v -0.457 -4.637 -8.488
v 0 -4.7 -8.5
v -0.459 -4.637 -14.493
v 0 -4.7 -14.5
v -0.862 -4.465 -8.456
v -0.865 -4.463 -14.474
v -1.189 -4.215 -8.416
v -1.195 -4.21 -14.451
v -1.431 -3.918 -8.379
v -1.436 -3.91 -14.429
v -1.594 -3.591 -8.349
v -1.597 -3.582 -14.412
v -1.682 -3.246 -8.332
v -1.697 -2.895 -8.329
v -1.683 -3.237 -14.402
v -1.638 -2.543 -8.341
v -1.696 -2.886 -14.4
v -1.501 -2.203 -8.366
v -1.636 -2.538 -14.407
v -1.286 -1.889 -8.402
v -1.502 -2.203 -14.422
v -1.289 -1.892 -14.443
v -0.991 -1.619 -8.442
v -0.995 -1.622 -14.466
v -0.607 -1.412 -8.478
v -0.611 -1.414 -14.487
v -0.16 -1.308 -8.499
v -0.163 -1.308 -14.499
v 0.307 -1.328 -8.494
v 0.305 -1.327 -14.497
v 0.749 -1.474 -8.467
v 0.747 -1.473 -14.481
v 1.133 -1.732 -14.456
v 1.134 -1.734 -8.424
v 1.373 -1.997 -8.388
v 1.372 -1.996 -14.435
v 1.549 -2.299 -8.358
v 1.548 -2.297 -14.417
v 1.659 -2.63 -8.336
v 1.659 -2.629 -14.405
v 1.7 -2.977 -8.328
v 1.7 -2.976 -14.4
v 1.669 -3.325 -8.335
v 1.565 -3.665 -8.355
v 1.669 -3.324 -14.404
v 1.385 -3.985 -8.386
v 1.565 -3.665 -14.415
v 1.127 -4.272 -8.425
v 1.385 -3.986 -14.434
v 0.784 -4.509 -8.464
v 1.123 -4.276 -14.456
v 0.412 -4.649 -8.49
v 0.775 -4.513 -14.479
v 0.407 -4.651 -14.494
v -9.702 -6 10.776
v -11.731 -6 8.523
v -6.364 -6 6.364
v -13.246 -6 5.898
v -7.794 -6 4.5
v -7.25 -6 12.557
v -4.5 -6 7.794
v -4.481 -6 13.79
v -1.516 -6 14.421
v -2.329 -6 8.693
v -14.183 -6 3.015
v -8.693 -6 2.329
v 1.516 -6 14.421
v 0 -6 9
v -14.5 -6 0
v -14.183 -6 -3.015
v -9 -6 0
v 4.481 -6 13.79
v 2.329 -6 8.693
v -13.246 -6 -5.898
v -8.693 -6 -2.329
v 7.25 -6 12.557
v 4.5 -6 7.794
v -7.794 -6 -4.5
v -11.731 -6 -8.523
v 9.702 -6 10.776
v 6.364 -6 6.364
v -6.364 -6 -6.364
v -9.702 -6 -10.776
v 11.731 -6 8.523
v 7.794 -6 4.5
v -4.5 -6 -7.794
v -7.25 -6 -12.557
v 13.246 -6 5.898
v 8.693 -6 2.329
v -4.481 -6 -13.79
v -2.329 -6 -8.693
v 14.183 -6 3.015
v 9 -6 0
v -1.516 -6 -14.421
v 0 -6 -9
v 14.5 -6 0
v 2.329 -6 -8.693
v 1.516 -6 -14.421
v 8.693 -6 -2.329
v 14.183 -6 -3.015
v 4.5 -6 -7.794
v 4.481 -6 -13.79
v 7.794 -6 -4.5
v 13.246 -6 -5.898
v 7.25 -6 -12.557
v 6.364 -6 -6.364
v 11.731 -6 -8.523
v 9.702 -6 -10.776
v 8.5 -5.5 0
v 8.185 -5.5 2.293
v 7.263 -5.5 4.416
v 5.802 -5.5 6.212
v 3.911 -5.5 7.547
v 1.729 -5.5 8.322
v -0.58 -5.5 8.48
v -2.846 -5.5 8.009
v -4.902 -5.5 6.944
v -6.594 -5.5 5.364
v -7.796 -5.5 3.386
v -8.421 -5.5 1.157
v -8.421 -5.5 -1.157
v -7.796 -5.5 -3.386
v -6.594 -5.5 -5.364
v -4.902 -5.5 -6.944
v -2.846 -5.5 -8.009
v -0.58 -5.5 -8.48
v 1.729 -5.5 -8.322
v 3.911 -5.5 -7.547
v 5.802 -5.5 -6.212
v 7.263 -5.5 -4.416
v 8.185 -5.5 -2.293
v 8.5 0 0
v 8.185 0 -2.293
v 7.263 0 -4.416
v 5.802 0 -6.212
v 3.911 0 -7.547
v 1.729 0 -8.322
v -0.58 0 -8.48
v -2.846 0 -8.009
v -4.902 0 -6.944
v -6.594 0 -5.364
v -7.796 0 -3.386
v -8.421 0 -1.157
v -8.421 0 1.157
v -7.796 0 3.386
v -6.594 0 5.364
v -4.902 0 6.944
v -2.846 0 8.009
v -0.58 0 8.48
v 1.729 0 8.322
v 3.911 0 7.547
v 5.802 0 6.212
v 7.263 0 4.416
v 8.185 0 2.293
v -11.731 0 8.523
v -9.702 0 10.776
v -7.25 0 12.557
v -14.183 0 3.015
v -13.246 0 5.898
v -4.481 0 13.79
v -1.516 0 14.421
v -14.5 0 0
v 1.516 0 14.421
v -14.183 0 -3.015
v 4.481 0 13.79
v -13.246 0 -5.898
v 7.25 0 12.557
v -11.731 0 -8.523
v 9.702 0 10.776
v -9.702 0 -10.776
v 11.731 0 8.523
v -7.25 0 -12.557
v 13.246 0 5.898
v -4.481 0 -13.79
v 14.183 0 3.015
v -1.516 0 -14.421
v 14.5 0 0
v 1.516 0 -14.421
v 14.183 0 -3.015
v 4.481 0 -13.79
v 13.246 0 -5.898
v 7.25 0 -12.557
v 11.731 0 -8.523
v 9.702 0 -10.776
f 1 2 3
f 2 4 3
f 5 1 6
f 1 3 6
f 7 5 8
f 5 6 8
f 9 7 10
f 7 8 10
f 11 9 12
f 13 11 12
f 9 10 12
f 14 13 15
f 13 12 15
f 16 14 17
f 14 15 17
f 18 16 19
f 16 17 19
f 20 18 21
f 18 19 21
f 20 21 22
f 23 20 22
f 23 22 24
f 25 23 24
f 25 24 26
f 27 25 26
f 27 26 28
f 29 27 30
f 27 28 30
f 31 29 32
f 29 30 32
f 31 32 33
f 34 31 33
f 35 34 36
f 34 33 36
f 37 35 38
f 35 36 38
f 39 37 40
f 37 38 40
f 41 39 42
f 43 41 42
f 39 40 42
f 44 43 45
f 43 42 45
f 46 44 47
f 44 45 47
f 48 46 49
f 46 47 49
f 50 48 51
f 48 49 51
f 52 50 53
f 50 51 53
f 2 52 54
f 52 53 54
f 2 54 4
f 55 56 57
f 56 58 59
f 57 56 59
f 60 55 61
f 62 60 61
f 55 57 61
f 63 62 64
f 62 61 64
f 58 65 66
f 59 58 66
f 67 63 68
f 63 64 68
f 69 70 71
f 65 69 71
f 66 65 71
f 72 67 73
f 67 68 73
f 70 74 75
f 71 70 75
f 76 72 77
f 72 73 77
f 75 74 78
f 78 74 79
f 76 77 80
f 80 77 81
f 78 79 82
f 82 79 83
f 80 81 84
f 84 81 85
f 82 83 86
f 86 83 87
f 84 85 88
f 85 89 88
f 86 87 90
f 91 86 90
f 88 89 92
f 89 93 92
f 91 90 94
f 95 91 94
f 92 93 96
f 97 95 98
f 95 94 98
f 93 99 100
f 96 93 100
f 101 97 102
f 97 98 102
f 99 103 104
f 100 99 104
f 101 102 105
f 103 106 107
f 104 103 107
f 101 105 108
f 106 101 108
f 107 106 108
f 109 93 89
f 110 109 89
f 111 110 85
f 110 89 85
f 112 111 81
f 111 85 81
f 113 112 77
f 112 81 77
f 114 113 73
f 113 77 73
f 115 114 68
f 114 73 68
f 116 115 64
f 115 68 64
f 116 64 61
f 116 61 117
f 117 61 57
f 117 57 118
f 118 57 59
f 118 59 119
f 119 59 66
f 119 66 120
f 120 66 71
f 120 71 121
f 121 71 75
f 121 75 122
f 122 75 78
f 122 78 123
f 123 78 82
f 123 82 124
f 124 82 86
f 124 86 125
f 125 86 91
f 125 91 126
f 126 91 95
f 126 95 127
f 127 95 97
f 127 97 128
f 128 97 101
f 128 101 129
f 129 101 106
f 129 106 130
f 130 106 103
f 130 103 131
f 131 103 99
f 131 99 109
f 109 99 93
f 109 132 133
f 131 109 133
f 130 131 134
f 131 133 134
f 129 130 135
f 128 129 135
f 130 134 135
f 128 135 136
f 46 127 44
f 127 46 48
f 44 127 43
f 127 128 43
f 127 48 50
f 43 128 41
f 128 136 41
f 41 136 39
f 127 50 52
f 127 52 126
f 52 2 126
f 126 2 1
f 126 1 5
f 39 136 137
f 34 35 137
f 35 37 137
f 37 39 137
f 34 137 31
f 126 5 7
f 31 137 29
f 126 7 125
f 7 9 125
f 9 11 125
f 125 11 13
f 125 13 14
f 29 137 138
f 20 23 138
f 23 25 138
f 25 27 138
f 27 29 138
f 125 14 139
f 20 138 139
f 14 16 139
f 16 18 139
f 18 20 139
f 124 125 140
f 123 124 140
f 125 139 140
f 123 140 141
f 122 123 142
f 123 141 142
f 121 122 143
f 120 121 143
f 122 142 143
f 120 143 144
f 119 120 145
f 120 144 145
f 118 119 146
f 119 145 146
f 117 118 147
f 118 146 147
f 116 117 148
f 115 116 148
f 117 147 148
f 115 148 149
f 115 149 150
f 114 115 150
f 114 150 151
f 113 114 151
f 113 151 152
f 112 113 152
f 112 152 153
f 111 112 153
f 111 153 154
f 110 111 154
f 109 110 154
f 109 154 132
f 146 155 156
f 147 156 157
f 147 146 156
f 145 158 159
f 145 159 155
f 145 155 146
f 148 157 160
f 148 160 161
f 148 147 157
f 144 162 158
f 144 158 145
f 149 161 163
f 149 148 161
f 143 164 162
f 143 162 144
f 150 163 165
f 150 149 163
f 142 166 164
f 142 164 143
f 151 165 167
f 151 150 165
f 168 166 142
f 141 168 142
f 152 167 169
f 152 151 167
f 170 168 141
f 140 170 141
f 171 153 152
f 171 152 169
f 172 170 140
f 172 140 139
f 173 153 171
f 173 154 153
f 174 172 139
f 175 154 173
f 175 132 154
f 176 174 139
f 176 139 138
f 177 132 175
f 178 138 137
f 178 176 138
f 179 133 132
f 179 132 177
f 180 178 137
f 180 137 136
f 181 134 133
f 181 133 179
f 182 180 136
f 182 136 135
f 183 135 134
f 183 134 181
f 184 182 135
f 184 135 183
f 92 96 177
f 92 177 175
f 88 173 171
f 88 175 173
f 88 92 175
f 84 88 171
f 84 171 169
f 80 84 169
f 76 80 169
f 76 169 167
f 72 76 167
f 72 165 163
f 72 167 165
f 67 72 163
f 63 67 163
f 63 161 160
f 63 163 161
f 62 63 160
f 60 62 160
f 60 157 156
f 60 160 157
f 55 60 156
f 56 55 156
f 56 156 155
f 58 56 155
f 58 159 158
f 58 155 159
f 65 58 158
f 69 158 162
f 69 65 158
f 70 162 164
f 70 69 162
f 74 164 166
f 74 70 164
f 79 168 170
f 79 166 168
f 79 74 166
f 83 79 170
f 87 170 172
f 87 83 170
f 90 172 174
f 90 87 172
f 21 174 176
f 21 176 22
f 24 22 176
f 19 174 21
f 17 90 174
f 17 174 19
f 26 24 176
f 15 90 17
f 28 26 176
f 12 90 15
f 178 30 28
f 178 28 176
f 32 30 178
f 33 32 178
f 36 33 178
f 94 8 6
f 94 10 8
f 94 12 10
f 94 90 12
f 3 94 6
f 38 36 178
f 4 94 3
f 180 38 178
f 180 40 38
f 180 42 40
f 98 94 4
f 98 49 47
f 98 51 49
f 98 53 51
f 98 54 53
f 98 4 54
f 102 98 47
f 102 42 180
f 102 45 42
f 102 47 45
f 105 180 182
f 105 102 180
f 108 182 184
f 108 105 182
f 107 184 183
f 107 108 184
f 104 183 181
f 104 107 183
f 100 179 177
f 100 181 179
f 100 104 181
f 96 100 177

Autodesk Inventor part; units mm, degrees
ref_plane "YZ Plane" through (0, 0, 0) normal (1, 0, 0) x (0, 1, 0)
ref_plane "XZ Plane" through (0, 0, 0) normal (0, 1, 0) x (-1, 0, 0)
ref_plane "XY Plane" through (0, 0, 0) normal (0, 0, 1) x (1, 0, 0)
sketch "Sketch1" plane through (0, 0, 0) normal (0, 0, 1) x (1, 0, 0)
  line L0 (8.5, 0) -> (14.5, 0)
  line L1 (14.5, 0) -> (14.5, 2.5)
  line L2 (14.5, 2.5) -> (8.5, 2.5)
  line L3 (8.5, 2.5) -> (8.5, 0)
  line L4 (8.5, 0) -> (14.5, 0)
  line L5 (14.5, 0) -> (14.5, -6)
  line L6 (14.5, -6) -> (8.5, -6)
  line L7 (8.5, -6) -> (8.5, 0)
  line L8 (0, -7.7) -> (0, 4.2) projected
  point P0 (0, 0)
  point P1 (14.5, 0)
  dimension "d0" = 2.5
  dimension "d1" = 8.5
  dimension "d2" = 6
  dimension "d3" = 6
  dimension "d4" = 6
revolve "Revolution1" add sketch "Sketch1" angle 360 about axis through (0, -10, 0) along (0, 1, 0) contours L0 L5 L6 L7
sketch "Sketch2" plane through (0, 0, 0) normal (0, 0, 1) x (1, 0, 0)
  line L0 (0, 0) -> (0, -6) construction
  line L1 (8.5, -6) -> (-8.5, -6) projected
  line L2 (8.5, 0) -> (-8.5, 0) projected
  point P0 (0, -3)
hole "Hole1" at (0, -3, 0) direction (0, 0, -1) diameter 3.4 end through all clearance for "Hex Head Cap Screw ISO 24017" size "M3" standard "ISO"
chamfer "Chamfer1" distance 0.5 angle 45 1 edges at (-8.5, -6, 0)
properties part number "spring safety"
